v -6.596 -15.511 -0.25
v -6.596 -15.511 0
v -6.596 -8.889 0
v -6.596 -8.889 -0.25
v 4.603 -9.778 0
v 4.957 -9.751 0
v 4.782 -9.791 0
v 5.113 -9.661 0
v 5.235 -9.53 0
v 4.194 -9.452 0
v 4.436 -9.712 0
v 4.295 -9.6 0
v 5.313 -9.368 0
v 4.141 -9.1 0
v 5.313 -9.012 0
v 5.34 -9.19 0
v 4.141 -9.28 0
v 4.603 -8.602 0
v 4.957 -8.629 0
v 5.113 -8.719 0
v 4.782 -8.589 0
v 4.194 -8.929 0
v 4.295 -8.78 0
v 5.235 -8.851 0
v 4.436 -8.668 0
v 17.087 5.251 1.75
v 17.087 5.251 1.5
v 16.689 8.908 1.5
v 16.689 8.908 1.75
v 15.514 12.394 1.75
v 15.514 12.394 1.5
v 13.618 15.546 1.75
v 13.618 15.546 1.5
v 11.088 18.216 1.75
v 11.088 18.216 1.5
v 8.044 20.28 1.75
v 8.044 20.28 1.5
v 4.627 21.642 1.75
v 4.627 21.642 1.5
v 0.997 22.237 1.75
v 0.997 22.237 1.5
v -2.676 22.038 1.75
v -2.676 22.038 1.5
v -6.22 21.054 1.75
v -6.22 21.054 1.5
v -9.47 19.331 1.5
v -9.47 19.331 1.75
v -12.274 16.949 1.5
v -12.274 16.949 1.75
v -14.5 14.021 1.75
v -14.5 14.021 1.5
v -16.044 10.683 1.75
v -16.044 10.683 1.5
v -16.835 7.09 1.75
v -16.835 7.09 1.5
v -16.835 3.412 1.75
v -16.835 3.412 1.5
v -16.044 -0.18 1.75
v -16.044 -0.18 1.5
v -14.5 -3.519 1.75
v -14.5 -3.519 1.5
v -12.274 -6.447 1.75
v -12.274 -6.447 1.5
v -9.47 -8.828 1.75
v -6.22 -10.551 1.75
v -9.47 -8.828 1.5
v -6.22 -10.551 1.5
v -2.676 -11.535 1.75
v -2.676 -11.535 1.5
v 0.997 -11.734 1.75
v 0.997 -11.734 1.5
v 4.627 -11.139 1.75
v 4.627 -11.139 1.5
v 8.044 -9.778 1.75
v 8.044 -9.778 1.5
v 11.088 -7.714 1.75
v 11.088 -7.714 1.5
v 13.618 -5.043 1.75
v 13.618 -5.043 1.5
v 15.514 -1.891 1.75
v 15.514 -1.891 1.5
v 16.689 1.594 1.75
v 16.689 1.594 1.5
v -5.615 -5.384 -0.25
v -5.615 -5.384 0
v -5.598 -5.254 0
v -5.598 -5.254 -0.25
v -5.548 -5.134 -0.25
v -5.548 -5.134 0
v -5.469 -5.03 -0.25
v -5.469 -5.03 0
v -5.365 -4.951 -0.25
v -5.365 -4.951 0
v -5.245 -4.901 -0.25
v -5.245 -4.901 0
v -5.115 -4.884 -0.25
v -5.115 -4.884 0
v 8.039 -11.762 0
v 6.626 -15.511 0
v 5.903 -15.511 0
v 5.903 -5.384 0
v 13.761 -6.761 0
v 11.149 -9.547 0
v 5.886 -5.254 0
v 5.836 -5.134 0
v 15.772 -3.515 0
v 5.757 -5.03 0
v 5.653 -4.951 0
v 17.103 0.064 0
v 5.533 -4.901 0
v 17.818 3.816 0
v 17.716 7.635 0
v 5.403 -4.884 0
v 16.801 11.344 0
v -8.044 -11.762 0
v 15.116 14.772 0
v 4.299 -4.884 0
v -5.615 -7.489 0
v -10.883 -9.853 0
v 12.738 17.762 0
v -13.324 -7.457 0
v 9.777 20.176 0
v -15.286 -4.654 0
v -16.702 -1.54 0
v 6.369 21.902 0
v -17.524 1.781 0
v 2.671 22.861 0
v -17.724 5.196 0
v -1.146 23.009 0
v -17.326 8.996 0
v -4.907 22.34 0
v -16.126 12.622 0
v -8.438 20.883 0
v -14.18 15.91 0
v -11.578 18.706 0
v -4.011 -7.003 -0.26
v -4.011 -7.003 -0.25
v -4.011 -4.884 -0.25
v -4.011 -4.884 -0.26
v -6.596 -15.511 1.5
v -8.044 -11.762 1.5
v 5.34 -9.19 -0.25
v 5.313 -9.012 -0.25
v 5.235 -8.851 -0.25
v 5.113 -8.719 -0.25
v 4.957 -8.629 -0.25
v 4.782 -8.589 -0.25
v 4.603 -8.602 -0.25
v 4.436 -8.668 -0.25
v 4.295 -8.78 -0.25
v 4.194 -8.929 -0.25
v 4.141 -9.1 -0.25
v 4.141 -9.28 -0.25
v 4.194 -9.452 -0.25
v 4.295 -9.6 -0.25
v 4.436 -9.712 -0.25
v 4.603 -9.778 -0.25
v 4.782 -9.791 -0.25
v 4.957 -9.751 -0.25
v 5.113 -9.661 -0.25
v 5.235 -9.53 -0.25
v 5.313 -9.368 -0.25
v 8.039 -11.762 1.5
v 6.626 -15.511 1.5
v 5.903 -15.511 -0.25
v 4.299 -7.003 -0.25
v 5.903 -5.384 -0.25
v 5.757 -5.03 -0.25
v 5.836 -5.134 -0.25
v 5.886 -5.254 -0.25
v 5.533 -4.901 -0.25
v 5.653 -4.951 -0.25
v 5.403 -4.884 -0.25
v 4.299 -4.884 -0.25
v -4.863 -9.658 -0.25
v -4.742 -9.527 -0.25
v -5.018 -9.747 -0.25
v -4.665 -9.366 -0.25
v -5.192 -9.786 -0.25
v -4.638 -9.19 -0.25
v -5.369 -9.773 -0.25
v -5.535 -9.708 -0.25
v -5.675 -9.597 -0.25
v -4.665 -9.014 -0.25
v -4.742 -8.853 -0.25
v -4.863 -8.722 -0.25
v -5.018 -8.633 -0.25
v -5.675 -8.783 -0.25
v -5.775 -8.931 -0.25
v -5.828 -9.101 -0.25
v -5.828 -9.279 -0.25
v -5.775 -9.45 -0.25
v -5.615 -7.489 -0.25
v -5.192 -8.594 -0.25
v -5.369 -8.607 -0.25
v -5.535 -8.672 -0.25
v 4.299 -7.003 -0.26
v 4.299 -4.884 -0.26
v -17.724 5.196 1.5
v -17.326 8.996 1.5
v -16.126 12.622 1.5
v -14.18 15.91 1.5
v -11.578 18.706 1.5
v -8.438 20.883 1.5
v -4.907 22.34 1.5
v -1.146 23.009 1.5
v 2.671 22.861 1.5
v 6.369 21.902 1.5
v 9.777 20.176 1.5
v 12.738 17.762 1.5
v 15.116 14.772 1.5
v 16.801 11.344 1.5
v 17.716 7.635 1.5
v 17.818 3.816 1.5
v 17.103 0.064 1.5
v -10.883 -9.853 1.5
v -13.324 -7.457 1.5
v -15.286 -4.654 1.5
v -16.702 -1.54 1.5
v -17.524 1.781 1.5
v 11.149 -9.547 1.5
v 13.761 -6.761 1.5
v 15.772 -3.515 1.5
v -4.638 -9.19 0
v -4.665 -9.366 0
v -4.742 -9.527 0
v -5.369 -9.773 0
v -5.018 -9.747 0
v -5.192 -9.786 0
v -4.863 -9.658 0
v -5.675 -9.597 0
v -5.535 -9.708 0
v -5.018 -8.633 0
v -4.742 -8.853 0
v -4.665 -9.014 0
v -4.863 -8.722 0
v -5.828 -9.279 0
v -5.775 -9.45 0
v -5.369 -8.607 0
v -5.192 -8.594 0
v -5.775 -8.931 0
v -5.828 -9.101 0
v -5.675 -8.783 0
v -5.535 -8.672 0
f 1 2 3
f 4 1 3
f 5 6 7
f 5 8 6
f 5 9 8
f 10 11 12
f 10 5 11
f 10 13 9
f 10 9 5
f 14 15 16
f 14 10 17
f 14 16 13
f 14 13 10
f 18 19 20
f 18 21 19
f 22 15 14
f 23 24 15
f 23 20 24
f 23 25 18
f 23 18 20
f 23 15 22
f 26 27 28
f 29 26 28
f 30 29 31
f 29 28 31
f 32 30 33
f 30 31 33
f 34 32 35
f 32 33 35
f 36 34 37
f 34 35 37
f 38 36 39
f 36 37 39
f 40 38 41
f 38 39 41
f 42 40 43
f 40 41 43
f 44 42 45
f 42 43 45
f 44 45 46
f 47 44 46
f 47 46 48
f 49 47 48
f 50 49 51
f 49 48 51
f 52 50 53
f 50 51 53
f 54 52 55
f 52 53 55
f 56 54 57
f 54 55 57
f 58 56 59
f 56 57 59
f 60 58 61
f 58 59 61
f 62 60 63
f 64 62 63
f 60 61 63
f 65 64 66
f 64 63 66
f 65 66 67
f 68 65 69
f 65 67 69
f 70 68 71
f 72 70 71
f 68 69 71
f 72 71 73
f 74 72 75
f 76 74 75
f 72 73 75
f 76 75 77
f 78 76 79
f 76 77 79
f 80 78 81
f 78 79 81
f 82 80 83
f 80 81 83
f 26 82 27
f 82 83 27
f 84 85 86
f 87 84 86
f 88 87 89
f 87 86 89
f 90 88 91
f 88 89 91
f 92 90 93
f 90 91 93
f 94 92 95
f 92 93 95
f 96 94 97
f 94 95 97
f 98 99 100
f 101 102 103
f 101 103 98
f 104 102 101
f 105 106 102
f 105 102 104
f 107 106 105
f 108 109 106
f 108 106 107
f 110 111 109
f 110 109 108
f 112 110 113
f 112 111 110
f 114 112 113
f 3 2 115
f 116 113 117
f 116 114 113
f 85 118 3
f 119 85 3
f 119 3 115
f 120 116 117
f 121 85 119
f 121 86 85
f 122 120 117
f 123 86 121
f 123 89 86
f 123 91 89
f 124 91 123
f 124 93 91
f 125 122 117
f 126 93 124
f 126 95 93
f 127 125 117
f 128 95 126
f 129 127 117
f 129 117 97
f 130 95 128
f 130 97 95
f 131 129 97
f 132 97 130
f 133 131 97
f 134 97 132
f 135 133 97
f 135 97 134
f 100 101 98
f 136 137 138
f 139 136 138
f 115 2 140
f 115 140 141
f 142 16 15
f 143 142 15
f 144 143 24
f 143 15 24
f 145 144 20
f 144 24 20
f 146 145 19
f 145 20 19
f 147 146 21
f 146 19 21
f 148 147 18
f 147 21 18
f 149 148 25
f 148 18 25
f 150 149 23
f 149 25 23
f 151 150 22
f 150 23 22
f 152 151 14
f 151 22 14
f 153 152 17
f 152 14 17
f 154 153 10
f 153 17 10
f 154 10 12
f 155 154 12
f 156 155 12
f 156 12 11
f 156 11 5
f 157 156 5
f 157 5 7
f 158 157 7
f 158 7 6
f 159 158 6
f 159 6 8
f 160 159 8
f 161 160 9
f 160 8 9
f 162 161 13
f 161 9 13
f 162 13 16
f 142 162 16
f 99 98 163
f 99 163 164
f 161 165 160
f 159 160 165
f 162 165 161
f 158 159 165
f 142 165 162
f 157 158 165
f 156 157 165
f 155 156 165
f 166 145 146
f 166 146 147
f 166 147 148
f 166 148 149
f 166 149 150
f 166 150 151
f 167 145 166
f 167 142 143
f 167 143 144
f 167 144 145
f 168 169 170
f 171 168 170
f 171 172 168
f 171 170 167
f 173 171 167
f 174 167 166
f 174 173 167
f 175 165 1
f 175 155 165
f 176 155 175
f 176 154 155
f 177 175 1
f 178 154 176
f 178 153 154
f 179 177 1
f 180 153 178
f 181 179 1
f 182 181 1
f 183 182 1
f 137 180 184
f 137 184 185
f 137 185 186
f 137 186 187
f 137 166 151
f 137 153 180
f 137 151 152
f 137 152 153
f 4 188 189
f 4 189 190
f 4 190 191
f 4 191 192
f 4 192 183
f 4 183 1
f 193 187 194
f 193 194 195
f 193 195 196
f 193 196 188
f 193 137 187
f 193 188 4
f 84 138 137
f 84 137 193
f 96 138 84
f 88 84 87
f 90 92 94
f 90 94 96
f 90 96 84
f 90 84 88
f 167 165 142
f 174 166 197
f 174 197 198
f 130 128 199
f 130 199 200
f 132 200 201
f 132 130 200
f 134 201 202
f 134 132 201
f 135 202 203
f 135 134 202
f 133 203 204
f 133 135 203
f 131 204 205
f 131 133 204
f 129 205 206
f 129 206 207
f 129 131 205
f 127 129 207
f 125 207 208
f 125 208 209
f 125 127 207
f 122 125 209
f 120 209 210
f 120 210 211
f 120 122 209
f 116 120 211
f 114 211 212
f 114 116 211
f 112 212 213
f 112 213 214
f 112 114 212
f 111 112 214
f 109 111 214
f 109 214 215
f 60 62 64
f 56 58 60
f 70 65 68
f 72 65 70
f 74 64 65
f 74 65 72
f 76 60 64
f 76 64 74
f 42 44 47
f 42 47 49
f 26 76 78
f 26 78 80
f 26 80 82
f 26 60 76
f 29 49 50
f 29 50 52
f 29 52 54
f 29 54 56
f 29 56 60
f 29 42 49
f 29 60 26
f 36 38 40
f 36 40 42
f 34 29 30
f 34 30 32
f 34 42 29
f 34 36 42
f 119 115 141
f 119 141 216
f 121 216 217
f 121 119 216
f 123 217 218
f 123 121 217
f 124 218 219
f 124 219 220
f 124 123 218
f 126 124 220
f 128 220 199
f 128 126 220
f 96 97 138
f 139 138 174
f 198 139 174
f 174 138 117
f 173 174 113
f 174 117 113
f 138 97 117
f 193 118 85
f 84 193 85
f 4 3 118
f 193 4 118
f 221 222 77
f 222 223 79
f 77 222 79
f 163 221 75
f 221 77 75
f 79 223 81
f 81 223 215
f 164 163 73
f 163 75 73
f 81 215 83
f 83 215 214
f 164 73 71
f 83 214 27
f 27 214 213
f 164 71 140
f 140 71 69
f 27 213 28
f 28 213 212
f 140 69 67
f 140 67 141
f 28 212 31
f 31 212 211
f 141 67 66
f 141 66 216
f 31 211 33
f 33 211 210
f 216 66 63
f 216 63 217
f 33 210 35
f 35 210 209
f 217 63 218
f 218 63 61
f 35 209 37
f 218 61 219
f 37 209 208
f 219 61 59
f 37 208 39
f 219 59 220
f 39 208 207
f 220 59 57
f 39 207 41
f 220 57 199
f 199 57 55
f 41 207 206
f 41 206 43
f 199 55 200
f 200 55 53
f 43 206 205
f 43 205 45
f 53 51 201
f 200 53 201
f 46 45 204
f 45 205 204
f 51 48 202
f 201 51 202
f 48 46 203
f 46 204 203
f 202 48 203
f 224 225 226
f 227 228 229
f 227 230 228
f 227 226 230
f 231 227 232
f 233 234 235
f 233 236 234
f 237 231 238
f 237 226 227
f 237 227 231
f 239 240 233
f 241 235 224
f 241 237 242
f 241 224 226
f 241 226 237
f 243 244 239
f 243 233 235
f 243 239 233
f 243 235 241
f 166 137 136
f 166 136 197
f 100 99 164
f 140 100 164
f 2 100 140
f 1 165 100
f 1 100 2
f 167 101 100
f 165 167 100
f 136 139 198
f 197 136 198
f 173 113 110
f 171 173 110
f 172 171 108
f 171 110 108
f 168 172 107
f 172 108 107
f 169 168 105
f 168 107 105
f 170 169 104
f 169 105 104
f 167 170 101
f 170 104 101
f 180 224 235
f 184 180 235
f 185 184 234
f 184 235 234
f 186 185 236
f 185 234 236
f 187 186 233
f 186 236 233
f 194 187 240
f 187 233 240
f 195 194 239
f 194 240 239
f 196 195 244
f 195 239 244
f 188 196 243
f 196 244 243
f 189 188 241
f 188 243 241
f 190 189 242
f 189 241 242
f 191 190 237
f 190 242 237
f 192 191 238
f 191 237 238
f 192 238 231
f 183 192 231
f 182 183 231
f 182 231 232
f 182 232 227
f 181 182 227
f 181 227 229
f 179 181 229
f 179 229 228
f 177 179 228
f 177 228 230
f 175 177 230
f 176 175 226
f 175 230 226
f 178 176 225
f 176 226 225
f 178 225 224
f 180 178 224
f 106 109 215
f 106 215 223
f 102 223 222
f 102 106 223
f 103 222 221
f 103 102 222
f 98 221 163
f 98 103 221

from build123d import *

# Parameters (mm, degrees)
LANGUETTE_R        = 0.598025677
LANGUETTE_R_2      = 0.602747005
BOSS_EXTRU_1_DEPTH = 0.25
CONTACTS_W         = 8.310994675
CONTACTS_H         = 2.119060631
BOSS_EXTRU_2_DEPTH = 0.26
BOSS_EXTRU_3_DEPTH = 1.5
ESQUISSE7_R        = 17.010621832
BOSS_EXTRU_4_DEPTH = 0.25


with BuildPart() as part:
    # languette → Boss.-Extru.1 (new body)
    with BuildSketch(Plane.XY):
        with BuildLine():
            Line((-6.595613447, -8.888713039), (-5.615374712, -7.488966567))
            Line((-5.615374712, -7.488966567), (-5.615374712, -5.383882856))
            ThreePointArc((-5.615374712, -5.383882856), (-5.468928102, -5.030329465), (-5.115374712, -4.883882856))
            Line((-5.115374712, -4.883882856), (5.403372294, -4.883882856))
            ThreePointArc((5.403372294, -4.883882856), (5.756925685, -5.030329465), (5.903372294, -5.383882856))
            Line((5.903372294, -5.383882856), (5.903372294, -15.510913379))
            Line((5.903372294, -15.510913379), (-6.595613447, -15.510913379))
            Line((-6.595613447, -15.510913379), (-6.595613447, -8.888713039))
        make_face()
        with Locations((-5.236276709, -9.190047348)):
            Circle(LANGUETTE_R, mode=Mode.SUBTRACT)
        with Locations((4.736916901, -9.190047348)):
            Circle(LANGUETTE_R_2, mode=Mode.SUBTRACT)
    extrude(amount=-BOSS_EXTRU_1_DEPTH)

    # contacts → Boss.-Extru.2 (add)
    with BuildSketch(Plane.XY):
        with Locations((0.143998792, -5.943413172)):
            Rectangle(CONTACTS_W, CONTACTS_H)
    extrude(amount=-BOSS_EXTRU_2_DEPTH)

    # Esquisse6 → Boss.-Extru.3 (add)
    with BuildSketch(Plane.XY):
        with BuildLine():
            Line((-6.595613447, -15.510913379), (-8.043725423, -11.761859924))
            ThreePointArc((-8.043725423, -11.761859924), (-15.286364086, -4.654195518), (-17.723977577, 5.196324701))
            ThreePointArc((-17.723977577, 5.196324701), (2.671119001, 22.861069139), (17.103268201, 0.063783556))
            ThreePointArc((17.103268201, 0.063783556), (13.761328931, -6.761125674), (8.03938861, -11.761859924))
            Line((8.03938861, -11.761859924), (6.626148003, -15.510913379))
            Line((6.626148003, -15.510913379), (-6.595613447, -15.510913379))
        make_face()
    extrude(amount=BOSS_EXTRU_3_DEPTH)

    # Esquisse7 → Boss.-Extru.4 (add)
    with BuildSketch(Plane.XY.offset(1.5)):
        with Locations((0.07593762, 5.251269776)):
            Circle(ESQUISSE7_R)
    extrude(amount=BOSS_EXTRU_4_DEPTH)


solid = part.part
